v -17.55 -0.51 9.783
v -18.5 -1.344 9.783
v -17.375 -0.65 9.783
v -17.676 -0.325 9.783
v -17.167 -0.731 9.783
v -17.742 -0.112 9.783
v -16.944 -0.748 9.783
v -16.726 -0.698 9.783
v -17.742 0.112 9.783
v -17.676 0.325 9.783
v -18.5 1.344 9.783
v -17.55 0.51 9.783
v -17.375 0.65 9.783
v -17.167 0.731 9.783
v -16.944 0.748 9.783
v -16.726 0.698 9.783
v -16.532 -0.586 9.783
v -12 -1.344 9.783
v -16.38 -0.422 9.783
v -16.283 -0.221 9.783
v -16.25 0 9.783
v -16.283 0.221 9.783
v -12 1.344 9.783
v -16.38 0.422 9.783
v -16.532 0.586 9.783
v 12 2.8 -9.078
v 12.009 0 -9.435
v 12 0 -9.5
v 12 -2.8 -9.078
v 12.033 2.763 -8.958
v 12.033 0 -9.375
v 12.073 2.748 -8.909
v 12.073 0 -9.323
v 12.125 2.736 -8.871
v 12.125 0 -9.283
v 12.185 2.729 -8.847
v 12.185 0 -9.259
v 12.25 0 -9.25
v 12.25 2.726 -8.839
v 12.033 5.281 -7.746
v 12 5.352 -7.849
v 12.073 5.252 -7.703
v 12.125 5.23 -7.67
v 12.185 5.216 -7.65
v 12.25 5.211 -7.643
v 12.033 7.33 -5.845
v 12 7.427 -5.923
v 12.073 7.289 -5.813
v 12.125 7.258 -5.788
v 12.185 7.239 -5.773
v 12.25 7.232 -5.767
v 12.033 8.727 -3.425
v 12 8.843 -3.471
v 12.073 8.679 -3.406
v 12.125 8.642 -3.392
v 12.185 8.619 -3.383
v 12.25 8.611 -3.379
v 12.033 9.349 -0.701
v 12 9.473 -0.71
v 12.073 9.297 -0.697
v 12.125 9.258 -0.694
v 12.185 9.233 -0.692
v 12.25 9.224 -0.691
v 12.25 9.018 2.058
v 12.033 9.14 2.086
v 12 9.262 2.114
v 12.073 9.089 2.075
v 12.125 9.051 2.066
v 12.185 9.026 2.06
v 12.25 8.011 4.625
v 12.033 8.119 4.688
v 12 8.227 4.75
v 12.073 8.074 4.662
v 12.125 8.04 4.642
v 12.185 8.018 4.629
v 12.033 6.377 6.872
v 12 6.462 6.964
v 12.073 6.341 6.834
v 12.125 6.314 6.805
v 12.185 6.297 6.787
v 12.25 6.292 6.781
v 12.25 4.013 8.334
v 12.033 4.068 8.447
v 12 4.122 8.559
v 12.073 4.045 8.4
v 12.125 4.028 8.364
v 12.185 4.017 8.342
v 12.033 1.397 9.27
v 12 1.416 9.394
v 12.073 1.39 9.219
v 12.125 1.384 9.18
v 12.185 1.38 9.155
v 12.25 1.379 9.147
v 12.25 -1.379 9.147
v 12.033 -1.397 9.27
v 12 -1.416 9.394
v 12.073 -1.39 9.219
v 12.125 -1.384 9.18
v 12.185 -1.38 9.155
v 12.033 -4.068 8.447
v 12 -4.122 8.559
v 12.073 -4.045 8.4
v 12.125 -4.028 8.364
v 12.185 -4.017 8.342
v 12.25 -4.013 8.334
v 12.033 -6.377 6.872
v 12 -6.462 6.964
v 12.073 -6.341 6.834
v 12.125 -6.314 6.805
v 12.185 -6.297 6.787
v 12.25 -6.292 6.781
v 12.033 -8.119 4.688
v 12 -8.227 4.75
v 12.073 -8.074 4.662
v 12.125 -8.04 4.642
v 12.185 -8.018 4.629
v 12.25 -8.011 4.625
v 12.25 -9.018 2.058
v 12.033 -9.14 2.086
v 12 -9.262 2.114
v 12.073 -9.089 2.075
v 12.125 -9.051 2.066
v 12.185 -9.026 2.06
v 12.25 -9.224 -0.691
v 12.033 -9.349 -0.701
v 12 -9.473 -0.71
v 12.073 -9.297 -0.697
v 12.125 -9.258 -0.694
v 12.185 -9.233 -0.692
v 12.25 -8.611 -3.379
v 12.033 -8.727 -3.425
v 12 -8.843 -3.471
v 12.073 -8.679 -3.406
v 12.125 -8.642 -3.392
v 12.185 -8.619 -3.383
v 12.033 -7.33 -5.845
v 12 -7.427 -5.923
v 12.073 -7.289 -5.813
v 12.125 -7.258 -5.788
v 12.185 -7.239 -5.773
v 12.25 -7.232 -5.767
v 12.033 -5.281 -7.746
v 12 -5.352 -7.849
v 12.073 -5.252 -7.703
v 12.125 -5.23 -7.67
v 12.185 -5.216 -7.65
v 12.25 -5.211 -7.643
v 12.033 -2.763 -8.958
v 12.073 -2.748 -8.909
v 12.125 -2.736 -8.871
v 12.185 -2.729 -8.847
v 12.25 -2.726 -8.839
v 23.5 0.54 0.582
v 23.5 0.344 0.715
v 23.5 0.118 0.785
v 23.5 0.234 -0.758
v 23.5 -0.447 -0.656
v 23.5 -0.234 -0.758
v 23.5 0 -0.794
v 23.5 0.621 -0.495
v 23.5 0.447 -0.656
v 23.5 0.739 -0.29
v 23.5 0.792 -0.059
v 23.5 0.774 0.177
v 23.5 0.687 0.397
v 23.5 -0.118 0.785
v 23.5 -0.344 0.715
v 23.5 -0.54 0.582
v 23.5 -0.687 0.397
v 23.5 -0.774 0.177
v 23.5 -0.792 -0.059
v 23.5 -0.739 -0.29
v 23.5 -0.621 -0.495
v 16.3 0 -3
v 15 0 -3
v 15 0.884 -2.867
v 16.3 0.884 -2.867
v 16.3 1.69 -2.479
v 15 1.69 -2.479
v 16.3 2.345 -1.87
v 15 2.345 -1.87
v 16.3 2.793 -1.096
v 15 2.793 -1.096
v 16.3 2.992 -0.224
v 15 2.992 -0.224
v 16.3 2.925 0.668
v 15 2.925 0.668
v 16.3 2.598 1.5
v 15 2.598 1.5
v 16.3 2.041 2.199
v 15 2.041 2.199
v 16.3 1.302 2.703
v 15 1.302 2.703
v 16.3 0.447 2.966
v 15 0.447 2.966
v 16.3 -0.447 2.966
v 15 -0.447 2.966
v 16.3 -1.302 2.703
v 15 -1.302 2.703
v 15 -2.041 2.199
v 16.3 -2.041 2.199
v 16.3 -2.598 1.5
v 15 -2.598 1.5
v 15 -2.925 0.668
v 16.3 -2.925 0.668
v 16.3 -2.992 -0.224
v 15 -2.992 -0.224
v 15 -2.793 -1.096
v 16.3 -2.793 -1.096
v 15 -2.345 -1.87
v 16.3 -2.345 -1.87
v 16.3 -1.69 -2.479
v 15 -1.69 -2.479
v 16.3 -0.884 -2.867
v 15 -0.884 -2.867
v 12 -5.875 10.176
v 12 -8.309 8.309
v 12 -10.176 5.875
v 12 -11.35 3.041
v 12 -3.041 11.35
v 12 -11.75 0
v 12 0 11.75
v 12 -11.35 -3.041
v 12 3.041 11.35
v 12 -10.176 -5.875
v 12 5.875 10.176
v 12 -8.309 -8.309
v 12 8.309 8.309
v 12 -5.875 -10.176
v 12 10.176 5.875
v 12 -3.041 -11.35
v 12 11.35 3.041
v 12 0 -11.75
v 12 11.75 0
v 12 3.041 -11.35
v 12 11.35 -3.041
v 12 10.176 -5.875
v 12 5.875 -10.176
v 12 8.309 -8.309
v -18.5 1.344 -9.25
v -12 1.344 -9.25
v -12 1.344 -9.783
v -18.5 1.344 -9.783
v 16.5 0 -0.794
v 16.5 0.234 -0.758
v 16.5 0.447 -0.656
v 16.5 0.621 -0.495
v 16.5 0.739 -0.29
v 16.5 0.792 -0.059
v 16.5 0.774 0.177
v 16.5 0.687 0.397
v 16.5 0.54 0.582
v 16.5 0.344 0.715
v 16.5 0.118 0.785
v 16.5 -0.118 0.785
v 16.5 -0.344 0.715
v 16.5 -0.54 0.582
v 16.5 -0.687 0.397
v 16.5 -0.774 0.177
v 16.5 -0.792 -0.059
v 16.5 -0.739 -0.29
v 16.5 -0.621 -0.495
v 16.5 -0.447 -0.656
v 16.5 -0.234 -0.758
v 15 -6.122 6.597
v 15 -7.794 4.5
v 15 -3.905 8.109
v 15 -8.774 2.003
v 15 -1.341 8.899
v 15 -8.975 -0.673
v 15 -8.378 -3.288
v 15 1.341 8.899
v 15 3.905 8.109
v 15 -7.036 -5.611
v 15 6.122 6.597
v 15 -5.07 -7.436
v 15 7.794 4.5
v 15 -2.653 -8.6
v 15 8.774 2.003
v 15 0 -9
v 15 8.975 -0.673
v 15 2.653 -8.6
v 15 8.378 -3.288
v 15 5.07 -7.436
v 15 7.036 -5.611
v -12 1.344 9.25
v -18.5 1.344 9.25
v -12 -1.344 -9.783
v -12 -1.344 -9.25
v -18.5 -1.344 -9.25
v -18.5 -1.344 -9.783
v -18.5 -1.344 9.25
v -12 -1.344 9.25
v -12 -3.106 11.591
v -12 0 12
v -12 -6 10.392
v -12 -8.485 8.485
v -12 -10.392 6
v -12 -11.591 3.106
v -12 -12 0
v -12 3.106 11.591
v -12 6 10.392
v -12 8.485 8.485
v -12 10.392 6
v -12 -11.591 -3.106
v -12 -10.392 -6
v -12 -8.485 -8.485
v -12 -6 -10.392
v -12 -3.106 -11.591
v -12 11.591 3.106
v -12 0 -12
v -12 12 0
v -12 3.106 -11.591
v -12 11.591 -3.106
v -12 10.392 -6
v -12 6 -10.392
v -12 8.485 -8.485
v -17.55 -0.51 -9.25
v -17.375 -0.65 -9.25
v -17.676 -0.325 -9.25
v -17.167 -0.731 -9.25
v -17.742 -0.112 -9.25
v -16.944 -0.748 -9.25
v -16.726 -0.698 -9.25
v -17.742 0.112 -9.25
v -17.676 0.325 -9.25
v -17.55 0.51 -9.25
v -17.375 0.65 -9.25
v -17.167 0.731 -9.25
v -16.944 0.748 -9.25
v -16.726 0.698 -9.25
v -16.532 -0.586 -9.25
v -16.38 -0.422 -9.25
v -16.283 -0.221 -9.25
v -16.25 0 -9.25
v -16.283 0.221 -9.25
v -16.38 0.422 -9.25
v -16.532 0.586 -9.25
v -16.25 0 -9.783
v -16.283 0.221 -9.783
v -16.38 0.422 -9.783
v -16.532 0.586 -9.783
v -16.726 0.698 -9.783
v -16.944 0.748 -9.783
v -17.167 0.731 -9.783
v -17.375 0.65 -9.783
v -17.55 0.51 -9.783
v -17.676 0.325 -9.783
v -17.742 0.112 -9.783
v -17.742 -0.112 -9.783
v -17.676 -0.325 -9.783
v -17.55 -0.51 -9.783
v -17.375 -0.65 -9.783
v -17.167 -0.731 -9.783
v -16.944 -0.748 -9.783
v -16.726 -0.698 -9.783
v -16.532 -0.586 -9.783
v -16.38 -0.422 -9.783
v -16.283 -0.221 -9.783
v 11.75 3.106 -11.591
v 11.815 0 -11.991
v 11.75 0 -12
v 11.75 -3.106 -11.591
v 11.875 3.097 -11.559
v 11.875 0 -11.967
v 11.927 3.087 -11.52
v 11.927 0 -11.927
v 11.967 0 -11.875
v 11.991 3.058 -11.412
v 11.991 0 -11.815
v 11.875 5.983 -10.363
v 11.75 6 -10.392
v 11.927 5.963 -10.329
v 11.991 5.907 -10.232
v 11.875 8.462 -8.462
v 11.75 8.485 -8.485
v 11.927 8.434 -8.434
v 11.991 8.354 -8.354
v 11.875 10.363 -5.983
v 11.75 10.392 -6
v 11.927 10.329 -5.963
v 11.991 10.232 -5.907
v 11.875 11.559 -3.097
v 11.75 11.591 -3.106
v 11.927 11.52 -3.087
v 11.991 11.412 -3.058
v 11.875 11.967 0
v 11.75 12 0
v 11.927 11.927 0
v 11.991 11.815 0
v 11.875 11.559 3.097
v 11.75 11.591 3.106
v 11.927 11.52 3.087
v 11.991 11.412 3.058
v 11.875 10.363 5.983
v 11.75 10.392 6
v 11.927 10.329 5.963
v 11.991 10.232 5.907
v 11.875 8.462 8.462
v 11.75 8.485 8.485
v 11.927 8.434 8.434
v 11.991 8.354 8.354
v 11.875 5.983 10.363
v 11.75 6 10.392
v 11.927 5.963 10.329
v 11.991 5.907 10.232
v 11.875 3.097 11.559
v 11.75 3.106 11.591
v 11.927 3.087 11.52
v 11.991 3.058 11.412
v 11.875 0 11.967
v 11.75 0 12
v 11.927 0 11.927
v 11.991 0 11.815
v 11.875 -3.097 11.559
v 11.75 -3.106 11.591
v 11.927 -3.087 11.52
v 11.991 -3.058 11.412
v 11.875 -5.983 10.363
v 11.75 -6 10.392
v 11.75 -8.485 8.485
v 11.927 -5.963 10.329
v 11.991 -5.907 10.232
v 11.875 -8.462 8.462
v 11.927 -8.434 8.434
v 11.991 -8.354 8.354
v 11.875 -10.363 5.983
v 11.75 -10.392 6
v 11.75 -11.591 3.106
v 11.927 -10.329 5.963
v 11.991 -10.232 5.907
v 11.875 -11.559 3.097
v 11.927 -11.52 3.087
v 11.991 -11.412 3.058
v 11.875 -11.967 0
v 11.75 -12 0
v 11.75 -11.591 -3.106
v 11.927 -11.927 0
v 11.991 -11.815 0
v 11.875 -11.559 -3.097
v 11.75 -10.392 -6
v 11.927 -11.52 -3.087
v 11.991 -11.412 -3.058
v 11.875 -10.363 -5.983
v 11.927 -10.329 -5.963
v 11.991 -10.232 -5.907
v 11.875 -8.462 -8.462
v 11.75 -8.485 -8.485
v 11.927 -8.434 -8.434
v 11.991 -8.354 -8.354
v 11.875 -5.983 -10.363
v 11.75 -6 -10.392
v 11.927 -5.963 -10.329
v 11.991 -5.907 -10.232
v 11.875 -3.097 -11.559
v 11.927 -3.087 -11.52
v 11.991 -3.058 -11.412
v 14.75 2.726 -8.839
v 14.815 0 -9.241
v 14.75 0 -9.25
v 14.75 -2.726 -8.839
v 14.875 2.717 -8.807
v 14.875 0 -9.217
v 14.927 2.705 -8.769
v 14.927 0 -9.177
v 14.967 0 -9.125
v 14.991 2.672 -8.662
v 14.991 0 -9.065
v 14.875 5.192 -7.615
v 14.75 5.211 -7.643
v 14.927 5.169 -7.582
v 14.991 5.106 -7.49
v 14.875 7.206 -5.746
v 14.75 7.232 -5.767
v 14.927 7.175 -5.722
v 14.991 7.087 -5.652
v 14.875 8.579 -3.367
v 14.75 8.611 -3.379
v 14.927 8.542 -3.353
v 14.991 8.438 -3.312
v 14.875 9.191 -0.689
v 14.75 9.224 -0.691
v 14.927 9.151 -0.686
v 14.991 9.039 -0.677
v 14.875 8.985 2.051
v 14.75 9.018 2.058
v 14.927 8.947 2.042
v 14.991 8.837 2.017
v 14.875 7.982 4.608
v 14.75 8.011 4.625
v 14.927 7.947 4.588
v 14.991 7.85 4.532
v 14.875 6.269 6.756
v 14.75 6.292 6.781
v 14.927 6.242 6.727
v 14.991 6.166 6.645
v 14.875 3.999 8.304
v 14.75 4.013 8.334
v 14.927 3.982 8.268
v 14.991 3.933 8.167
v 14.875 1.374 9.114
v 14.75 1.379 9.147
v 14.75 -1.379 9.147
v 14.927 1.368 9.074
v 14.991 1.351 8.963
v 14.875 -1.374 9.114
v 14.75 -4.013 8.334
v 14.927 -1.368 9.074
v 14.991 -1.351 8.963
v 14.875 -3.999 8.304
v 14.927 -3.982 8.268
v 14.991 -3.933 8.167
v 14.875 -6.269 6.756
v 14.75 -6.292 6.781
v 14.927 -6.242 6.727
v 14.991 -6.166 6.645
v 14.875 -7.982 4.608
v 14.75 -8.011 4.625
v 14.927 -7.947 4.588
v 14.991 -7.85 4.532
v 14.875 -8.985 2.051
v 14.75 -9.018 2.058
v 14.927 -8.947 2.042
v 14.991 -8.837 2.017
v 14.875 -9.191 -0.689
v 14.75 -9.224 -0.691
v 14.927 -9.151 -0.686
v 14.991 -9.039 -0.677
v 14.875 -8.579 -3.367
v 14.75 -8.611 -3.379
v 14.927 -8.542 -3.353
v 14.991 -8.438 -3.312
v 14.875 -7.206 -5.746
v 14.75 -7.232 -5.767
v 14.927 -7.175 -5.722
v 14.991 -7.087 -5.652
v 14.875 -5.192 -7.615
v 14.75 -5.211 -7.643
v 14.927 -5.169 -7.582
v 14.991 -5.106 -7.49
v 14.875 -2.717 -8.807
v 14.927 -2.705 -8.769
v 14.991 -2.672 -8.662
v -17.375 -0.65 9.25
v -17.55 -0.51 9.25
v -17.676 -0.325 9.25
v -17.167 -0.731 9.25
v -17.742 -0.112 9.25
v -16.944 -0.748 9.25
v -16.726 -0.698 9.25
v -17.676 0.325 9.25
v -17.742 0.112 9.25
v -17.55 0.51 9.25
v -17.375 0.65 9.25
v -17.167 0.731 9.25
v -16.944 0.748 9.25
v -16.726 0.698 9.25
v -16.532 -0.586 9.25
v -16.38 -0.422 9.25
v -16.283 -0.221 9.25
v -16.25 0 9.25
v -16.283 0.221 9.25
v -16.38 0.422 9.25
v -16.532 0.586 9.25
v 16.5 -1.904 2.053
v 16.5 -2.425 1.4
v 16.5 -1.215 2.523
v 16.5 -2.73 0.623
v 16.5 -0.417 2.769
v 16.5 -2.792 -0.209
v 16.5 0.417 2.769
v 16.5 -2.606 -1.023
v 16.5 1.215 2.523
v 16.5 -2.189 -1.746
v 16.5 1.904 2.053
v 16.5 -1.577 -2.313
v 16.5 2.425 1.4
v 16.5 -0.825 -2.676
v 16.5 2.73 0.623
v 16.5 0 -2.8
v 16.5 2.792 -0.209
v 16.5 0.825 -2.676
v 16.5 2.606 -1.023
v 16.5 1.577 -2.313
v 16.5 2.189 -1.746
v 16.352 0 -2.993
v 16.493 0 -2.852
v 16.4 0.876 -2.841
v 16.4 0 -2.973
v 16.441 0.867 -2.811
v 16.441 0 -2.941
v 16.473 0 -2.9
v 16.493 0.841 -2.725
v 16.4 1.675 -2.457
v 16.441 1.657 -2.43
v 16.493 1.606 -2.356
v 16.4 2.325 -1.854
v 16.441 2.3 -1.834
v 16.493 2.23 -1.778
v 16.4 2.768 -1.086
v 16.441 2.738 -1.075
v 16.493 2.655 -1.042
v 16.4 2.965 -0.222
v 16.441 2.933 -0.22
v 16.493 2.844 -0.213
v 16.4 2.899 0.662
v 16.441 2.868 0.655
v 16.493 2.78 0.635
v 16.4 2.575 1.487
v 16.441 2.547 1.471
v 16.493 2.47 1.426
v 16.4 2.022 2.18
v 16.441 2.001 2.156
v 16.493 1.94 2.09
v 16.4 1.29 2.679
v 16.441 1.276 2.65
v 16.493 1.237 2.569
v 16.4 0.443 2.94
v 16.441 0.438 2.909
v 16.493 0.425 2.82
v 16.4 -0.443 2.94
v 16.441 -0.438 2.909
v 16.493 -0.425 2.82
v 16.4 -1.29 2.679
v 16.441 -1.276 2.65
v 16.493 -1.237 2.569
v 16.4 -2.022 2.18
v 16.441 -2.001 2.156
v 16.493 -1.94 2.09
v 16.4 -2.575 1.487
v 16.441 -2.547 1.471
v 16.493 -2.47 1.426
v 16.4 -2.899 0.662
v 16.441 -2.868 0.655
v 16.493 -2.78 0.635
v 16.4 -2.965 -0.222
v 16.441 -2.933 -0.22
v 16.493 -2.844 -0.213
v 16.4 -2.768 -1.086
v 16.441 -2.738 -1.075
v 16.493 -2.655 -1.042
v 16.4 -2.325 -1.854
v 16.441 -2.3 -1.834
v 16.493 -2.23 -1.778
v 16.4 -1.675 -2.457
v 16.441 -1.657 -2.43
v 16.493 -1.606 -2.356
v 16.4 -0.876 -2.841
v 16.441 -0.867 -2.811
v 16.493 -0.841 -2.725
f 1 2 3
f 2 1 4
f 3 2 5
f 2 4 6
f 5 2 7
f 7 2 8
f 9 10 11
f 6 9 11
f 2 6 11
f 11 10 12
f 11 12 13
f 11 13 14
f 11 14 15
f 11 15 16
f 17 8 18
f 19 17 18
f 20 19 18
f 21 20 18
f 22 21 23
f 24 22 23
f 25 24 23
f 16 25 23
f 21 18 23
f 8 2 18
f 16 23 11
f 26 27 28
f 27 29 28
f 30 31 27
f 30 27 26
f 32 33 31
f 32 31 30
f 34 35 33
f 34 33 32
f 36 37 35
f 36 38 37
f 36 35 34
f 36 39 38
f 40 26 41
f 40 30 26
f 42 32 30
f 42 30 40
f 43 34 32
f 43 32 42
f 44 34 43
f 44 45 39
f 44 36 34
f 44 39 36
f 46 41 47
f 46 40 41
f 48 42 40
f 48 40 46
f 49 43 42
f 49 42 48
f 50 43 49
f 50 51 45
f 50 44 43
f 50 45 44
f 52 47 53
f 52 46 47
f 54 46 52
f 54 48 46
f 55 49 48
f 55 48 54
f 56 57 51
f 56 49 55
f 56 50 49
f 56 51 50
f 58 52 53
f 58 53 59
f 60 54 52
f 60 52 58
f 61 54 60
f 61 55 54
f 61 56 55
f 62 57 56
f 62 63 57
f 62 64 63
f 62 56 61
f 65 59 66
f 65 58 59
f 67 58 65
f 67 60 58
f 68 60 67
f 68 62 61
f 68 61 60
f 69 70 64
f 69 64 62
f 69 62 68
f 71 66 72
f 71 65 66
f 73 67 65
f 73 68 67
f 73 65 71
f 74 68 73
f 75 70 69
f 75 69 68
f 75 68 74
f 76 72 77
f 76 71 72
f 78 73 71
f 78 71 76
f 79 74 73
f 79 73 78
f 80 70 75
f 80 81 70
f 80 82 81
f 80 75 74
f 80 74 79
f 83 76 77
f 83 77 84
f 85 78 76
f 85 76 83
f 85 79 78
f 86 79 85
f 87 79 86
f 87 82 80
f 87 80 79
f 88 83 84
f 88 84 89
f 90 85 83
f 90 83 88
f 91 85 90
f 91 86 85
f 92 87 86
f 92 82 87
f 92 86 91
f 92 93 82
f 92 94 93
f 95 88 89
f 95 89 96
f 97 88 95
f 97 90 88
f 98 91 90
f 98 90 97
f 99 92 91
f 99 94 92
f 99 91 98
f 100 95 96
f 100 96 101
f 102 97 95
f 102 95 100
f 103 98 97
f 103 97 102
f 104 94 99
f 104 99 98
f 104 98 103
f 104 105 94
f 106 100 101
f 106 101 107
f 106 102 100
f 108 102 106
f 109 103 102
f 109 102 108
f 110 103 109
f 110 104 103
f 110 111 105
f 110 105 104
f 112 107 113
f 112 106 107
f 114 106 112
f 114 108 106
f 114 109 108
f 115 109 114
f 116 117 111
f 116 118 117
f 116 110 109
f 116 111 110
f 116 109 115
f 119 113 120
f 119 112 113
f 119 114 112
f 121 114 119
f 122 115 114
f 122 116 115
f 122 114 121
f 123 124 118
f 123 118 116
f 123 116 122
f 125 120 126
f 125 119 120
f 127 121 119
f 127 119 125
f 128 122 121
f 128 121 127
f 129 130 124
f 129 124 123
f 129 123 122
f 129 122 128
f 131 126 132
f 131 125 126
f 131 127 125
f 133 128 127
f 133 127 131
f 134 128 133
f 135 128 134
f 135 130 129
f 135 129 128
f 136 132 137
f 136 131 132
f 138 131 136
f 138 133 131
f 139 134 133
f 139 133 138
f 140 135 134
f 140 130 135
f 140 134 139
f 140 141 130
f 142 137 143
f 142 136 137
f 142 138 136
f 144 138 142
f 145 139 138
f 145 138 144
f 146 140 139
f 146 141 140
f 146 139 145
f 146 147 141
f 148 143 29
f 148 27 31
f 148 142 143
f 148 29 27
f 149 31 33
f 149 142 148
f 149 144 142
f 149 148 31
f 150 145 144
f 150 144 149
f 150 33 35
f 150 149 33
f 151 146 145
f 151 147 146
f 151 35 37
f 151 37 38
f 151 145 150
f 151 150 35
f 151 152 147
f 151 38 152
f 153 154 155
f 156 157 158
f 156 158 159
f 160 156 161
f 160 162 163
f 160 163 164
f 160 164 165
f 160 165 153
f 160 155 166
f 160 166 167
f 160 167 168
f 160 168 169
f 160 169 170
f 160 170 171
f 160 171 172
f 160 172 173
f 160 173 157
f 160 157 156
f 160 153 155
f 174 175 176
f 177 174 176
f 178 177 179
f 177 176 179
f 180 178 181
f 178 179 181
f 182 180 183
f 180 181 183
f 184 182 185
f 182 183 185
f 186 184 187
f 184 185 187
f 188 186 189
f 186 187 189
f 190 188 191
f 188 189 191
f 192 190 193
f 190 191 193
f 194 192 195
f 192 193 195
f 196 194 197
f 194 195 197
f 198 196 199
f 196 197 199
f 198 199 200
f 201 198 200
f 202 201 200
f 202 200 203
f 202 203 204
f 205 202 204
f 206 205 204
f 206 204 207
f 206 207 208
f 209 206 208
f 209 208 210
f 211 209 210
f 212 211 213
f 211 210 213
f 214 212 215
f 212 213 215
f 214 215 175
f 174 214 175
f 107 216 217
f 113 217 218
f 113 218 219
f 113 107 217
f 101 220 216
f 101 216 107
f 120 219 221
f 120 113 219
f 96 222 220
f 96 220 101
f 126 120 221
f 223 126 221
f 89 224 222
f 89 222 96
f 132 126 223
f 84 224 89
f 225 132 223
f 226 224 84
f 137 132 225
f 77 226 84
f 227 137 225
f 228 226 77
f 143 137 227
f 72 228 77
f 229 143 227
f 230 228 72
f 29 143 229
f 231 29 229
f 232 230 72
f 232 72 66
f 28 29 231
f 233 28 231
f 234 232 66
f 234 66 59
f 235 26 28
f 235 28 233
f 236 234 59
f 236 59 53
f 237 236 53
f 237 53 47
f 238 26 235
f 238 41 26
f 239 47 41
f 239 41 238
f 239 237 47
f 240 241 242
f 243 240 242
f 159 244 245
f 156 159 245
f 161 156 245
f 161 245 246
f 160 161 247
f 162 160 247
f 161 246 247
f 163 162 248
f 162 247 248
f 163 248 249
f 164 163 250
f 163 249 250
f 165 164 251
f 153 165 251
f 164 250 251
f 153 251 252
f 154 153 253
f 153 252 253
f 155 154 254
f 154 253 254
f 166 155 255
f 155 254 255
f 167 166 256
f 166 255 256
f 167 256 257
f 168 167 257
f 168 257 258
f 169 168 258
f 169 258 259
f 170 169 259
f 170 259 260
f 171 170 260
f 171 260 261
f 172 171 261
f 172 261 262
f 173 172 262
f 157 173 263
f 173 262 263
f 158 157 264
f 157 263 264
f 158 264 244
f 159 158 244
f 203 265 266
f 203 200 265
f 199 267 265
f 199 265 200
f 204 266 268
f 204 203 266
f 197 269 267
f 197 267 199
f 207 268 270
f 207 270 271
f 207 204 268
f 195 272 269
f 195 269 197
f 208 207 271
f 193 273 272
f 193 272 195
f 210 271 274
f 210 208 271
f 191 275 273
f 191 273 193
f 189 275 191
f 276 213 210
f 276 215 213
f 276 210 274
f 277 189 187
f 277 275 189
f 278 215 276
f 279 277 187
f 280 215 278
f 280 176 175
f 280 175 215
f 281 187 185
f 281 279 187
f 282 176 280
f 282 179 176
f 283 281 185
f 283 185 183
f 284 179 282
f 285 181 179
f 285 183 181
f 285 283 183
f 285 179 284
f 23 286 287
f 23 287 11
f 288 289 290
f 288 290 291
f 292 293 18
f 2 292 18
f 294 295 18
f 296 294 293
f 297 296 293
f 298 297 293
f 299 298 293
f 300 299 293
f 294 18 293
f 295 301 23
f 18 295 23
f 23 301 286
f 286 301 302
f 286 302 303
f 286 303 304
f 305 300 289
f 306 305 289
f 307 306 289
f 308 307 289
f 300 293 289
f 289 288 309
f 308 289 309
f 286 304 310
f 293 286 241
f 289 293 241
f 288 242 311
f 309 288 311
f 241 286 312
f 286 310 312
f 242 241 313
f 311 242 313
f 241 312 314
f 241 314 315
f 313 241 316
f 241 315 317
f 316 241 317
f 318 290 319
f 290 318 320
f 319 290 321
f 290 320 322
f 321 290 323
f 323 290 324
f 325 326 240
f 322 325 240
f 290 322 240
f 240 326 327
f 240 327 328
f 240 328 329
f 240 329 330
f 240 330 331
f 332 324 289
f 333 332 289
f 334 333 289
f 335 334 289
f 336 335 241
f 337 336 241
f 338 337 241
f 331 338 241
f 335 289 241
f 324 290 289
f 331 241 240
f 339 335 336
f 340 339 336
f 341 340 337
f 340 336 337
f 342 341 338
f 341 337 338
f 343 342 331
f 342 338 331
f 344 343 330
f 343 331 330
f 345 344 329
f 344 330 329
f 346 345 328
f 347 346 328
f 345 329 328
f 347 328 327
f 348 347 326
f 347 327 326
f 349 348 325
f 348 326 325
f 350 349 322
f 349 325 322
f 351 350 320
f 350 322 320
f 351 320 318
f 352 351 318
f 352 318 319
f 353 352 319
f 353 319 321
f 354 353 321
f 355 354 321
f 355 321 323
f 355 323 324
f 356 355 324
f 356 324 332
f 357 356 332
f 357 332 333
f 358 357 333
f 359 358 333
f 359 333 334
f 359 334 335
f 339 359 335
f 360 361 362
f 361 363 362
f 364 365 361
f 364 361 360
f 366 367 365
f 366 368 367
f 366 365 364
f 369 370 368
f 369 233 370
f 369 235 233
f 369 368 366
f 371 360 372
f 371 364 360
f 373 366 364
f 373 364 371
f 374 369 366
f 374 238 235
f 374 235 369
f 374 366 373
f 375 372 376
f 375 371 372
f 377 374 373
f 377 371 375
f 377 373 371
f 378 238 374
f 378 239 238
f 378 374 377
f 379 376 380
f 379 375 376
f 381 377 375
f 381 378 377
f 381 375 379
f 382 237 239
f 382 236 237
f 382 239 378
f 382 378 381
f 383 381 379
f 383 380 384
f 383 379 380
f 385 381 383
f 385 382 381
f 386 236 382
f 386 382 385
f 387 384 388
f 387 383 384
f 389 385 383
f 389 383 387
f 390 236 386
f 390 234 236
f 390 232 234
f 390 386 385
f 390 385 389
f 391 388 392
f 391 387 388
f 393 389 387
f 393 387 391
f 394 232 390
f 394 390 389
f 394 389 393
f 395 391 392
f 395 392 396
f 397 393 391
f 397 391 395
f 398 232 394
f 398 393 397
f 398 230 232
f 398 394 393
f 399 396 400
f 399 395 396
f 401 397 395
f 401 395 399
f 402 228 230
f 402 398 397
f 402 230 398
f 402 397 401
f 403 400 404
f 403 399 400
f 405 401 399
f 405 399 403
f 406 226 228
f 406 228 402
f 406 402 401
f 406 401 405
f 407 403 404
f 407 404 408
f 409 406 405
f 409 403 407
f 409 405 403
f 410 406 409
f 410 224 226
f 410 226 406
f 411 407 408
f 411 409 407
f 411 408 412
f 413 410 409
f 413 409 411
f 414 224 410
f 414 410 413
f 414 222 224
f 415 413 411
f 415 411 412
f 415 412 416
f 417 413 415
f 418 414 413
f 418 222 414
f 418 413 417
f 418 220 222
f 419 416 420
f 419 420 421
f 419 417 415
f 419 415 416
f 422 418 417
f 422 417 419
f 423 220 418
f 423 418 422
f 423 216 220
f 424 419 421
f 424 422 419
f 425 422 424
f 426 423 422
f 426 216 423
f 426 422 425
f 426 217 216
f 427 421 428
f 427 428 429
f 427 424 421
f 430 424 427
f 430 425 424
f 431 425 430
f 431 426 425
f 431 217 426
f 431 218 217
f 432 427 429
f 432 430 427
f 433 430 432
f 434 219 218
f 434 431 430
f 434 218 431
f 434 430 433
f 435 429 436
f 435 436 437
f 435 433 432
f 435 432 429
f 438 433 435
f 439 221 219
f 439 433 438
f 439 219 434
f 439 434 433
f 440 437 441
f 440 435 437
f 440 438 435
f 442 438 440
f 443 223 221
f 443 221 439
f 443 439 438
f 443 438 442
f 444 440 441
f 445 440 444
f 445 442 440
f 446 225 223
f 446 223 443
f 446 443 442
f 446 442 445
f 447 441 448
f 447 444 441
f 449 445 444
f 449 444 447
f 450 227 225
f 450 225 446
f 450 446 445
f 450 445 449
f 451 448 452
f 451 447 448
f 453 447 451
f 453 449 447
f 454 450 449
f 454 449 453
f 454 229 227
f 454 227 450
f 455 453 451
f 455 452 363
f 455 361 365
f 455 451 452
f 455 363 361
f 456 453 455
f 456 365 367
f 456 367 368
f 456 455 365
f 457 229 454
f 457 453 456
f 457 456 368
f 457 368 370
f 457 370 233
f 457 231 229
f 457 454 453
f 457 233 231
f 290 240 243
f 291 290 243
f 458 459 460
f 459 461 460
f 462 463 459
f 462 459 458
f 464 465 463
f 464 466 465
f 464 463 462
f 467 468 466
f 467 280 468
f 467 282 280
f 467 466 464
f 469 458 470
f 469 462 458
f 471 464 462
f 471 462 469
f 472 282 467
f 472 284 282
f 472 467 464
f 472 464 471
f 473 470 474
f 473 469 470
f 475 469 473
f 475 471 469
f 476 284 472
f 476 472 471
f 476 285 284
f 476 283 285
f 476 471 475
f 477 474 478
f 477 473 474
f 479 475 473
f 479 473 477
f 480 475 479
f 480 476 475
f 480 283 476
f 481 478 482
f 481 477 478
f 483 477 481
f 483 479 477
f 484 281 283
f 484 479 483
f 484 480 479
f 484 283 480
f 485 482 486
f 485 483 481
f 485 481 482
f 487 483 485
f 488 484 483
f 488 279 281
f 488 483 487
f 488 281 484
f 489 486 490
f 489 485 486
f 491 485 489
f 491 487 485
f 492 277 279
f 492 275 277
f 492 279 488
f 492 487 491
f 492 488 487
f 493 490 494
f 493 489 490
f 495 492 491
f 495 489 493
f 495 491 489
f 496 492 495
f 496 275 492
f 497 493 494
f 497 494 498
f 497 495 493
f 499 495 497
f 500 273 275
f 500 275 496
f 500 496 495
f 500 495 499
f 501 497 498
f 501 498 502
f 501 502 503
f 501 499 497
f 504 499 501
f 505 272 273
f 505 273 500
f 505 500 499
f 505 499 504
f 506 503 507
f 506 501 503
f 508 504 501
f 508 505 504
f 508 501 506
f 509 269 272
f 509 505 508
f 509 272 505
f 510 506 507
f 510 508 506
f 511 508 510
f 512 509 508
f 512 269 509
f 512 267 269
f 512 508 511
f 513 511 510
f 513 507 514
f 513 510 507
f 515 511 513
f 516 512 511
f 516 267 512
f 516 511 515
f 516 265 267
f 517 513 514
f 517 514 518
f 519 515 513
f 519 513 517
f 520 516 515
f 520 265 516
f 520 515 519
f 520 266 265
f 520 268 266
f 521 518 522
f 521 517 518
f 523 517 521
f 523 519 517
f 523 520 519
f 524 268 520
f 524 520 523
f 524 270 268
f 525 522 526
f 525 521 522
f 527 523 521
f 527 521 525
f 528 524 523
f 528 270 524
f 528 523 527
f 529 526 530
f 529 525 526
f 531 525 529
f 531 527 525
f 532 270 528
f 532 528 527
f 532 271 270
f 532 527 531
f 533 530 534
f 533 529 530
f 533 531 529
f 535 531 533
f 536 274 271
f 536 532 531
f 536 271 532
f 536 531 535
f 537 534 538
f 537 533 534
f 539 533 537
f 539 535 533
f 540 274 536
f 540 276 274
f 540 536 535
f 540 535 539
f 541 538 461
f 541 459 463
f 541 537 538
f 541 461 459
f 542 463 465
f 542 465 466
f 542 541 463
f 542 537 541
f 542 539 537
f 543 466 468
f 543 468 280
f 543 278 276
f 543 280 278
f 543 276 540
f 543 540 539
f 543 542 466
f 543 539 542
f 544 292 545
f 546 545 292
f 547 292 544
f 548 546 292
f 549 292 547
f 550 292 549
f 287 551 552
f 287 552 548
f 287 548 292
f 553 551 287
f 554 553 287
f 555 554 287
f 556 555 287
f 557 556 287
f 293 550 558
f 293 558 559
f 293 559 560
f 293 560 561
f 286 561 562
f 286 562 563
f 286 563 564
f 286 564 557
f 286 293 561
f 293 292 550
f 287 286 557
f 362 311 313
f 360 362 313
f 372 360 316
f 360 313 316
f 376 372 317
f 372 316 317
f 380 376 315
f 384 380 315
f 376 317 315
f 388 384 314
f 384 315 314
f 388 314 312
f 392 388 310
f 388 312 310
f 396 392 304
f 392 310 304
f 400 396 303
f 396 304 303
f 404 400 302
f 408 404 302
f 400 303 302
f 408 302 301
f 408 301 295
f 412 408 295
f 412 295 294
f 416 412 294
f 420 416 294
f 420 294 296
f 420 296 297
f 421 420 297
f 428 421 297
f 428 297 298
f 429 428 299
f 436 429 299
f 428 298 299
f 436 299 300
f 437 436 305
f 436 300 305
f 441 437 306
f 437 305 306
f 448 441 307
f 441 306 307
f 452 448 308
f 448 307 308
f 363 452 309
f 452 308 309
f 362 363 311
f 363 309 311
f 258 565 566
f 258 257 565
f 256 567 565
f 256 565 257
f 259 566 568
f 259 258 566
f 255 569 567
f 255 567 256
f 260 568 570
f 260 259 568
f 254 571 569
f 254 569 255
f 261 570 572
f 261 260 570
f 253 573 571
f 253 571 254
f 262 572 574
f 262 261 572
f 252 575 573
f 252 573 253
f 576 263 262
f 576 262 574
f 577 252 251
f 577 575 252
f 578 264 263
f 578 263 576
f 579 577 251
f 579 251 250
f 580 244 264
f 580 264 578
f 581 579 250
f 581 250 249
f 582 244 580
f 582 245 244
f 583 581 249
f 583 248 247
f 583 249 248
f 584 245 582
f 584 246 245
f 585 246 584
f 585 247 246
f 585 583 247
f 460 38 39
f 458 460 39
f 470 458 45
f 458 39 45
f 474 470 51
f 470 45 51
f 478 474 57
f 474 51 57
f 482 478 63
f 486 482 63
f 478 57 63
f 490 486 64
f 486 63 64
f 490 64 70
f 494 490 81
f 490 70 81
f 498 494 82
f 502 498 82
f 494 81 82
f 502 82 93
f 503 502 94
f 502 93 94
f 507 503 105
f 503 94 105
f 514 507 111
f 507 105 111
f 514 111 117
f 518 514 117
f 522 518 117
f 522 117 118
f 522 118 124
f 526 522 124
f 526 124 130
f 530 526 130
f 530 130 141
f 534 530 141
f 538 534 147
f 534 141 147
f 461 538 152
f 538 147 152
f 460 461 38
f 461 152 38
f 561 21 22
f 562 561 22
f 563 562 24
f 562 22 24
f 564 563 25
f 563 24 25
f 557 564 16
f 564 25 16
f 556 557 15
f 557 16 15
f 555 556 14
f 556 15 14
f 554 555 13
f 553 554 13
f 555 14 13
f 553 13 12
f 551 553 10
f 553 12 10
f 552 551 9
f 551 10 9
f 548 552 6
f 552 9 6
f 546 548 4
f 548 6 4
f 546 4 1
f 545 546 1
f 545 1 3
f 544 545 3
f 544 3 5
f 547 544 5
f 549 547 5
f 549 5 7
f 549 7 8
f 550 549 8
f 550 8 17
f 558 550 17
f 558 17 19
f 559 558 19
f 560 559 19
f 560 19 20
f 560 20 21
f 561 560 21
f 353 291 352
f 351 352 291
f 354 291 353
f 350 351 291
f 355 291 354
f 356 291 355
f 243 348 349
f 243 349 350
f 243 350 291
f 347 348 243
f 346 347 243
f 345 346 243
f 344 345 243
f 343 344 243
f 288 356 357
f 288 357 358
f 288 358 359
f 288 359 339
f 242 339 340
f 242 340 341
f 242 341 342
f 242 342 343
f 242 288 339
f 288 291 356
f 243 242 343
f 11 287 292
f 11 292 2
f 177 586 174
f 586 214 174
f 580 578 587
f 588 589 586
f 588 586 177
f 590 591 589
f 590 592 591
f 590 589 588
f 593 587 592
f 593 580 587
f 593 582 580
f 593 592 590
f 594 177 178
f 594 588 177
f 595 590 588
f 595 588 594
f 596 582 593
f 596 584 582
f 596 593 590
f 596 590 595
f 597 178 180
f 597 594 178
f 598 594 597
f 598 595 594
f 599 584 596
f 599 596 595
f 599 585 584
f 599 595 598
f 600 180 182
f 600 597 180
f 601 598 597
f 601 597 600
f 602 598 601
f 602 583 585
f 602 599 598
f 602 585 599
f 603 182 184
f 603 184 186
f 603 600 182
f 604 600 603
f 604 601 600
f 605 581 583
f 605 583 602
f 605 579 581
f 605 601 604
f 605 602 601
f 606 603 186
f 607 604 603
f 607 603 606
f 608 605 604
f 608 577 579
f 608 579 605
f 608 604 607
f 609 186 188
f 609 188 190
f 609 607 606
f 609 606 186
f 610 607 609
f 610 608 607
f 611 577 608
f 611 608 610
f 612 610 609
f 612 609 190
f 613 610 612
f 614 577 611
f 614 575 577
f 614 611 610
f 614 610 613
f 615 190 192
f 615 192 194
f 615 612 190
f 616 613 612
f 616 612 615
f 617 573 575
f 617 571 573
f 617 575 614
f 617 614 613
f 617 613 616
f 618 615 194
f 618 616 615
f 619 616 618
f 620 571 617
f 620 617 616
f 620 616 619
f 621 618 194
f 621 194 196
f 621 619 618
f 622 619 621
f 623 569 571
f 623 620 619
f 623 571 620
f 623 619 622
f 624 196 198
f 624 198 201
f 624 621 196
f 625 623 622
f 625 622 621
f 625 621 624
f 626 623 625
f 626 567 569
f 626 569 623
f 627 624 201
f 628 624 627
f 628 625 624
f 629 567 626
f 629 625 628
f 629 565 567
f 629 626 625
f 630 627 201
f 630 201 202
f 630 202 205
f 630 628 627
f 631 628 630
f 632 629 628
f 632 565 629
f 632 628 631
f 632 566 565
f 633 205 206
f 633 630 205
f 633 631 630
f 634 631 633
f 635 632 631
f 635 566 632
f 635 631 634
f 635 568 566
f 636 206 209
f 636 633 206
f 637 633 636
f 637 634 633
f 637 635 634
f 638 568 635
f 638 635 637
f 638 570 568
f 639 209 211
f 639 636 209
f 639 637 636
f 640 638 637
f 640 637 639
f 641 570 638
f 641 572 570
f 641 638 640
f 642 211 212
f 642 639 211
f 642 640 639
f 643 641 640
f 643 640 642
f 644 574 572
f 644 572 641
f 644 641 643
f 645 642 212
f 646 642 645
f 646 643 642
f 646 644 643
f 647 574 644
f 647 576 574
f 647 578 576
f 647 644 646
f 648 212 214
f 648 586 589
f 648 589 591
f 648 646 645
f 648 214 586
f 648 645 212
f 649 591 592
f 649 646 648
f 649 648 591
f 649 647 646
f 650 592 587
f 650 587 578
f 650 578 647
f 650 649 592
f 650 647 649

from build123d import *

# Parameters (mm, degrees)
BOSS_EXTRUDE1_DEPTH      = 12
BOSS_EXTRUDE1_DEPTH_BACK = 12
SKETCH1_R                = 12
SKETCH2_R                = 9.25
BOSS_EXTRUDE2_DEPTH      = 3
SKETCH3_R                = 3
BOSS_EXTRUDE3_DEPTH      = 1.5
SKETCH4_R                = 0.79375
BOSS_EXTRUDE4_DEPTH      = 7
FILLET1_R                = 0.25
FILLET2_R                = 0.2
SKETCH5_W                = 0.5328248
SKETCH5_H                = 2.687879882
BOSS_EXTRUDE5_DEPTH      = 6.5
SKETCH7_R                = 0.75
CUT_EXTRUDE1_DEPTH       = 35.216099373


with BuildPart() as part:
    # Sketch1 → Boss-Extrude1 (new, two sides: drawn at the far end of the back side and taken through both)
    with BuildSketch(Plane(origin=(0, 0, 0), x_dir=(0, 0, -1), z_dir=(1, 0, 0)).offset(-BOSS_EXTRUDE1_DEPTH_BACK)):
        Circle(SKETCH1_R)
    extrude(amount=BOSS_EXTRUDE1_DEPTH + BOSS_EXTRUDE1_DEPTH_BACK)

    # Sketch2 → Boss-Extrude2 (add)
    with BuildSketch(Plane(origin=(12, 0, 0), x_dir=(0, 0, -1), z_dir=(1, 0, 0))):
        Circle(SKETCH2_R)
    extrude(amount=BOSS_EXTRUDE2_DEPTH)

    # Sketch3 → Boss-Extrude3 (add)
    with BuildSketch(Plane(origin=(15, 0, 0), x_dir=(0, 0, -1), z_dir=(1, 0, 0))):
        Circle(SKETCH3_R)
    extrude(amount=BOSS_EXTRUDE3_DEPTH)

    # Sketch4 → Boss-Extrude4 (add)
    with BuildSketch(Plane(origin=(16.5, 0, 0), x_dir=(0, 0, -1), z_dir=(1, 0, 0))):
        Circle(SKETCH4_R)
    extrude(amount=BOSS_EXTRUDE4_DEPTH)

    # Fillet1
    fillet1_edges = [part.edges().sort_by_distance(p)[0] for p in [
        (12, 0, 12),
        (12, 0, 9.25),
        (15, 0, 9.25),
    ]]
    fillet(fillet1_edges, radius=FILLET1_R)

    # Fillet2
    fillet2_edges = [part.edges().sort_by_distance(p)[0] for p in [
        (16.5, 0, 3),
    ]]
    fillet(fillet2_edges, radius=FILLET2_R)

    # Sketch5 → Boss-Extrude5 (add)
    with BuildSketch(Plane.ZY.offset(12)):
        with Locations((9.5164124, 0)):
            Rectangle(SKETCH5_W, SKETCH5_H)
    boss_extrude5 = extrude(amount=BOSS_EXTRUDE5_DEPTH)

    # Mirror1: Boss-Extrude5 across plane
    add(boss_extrude5.mirror(Plane.XY))

    # Sketch7 → Cut-Extrude1 (cut, through all)
    with BuildSketch(Plane.XY.offset(9.7828248)):
        with Locations((-17, 0)):
            Circle(SKETCH7_R)
    extrude(amount=-CUT_EXTRUDE1_DEPTH, mode=Mode.SUBTRACT)


solid = part.part
